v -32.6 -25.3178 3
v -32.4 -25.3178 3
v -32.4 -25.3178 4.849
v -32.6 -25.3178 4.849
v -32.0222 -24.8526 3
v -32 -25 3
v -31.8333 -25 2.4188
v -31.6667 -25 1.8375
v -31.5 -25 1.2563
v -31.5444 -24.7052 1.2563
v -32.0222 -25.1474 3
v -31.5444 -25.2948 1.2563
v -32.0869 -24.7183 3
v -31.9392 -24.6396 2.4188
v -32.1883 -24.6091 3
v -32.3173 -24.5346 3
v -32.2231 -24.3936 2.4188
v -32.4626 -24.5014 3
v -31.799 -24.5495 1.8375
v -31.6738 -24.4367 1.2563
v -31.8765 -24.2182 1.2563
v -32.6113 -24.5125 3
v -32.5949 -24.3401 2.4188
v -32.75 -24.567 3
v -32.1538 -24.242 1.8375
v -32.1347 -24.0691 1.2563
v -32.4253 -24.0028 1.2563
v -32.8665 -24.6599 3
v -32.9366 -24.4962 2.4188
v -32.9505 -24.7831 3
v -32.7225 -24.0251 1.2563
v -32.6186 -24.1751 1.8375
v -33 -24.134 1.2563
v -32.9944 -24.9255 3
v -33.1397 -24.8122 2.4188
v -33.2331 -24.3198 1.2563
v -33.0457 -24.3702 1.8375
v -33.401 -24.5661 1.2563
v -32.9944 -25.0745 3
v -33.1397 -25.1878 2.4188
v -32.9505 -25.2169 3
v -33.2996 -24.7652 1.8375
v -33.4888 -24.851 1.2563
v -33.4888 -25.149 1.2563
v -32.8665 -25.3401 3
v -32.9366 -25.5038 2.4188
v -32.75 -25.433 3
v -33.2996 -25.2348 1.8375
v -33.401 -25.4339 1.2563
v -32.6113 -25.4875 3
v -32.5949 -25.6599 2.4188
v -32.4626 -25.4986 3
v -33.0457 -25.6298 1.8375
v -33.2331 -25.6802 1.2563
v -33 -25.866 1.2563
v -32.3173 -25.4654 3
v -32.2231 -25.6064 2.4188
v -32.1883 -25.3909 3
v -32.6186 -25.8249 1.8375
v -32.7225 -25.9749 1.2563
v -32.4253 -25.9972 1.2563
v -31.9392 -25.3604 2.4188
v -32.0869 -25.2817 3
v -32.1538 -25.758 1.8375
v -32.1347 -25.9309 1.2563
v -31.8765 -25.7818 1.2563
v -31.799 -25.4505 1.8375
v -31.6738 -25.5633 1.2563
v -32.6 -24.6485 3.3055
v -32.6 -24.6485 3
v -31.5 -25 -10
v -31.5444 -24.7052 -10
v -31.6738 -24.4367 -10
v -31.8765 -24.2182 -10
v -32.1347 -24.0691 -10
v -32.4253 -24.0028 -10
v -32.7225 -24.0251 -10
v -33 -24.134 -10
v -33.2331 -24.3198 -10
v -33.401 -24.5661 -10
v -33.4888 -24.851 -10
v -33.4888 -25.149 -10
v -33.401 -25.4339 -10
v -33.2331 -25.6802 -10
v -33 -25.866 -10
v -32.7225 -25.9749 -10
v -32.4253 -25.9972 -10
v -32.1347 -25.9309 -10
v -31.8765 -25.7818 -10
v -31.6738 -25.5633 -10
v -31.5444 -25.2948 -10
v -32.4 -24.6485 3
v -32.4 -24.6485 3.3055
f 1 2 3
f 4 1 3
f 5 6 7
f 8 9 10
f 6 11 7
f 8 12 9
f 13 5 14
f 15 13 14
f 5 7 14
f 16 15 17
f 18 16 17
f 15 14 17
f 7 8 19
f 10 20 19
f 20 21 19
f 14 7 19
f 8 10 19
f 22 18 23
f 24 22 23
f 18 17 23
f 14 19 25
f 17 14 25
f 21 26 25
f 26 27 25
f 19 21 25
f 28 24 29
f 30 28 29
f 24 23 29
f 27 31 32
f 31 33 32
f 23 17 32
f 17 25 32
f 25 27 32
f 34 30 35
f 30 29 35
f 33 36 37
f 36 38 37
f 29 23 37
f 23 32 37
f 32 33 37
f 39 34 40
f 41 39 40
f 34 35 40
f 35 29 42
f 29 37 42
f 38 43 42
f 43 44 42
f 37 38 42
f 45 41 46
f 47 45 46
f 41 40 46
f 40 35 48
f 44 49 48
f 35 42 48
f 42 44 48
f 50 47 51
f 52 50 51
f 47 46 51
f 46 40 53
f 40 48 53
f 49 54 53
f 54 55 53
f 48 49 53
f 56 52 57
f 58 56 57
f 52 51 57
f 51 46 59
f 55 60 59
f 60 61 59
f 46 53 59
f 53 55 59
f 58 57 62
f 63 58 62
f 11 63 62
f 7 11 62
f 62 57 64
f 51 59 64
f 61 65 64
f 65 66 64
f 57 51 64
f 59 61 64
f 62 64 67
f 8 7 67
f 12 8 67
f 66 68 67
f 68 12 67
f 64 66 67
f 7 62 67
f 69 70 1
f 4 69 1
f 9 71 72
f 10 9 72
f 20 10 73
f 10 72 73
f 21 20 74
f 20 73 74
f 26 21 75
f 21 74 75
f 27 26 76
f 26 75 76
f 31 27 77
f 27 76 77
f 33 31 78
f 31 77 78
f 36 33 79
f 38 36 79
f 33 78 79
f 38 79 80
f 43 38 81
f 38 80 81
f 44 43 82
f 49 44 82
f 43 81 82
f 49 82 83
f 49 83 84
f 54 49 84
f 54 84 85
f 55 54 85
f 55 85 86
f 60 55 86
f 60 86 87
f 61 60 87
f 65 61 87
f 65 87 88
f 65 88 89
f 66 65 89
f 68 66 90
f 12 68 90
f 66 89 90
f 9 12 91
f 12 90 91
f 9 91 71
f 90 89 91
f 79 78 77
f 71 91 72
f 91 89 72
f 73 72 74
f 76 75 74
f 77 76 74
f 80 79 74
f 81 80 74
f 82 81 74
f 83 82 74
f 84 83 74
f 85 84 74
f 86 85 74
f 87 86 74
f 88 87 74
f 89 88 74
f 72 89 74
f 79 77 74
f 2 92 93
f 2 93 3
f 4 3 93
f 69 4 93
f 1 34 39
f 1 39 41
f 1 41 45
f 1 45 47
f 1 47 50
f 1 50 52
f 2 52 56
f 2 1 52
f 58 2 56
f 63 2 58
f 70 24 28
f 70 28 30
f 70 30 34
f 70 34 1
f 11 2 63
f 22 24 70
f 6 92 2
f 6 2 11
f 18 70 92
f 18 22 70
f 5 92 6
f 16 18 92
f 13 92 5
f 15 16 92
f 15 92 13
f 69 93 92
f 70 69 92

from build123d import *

# Parameters (mm, degrees)
BOSS_EXTRUDE1_DEPTH      = 3
BOSS_EXTRUDE1_DEPTH_BACK = 10
SKETCH1_R                = 1
CHAMFER1_SIZE            = 0.5
CHAMFER1_SIZE2           = 1.743707222
BOSS_EXTRUDE2_DEPTH      = 0.1
BOSS_EXTRUDE2_DEPTH_BACK = 0.1


with BuildPart() as part:
    # Sketch1 → Boss-Extrude1 (new, two sides: drawn at the far end of the back side and taken through both)
    with BuildSketch(Plane.XY.offset(-BOSS_EXTRUDE1_DEPTH_BACK)):
        with Locations((-32.5, -25)):
            Circle(SKETCH1_R)
    extrude(amount=BOSS_EXTRUDE1_DEPTH + BOSS_EXTRUDE1_DEPTH_BACK)

    # Chamfer1
    chamfer1_edges = [part.edges().sort_by_distance(p)[0] for p in [
        (-33.5, -25, 3),
    ]]
    chamfer1_side = [part.faces().sort_by_distance(p)[0] for p in [
        (-32.5, -25, 3),
    ]]
    chamfer(chamfer1_edges, length=CHAMFER1_SIZE, length2=CHAMFER1_SIZE2, reference=chamfer1_side[0])

    # Sketch2 → Boss-Extrude2 (add, two sides: drawn at the far end of the back side and taken through both)
    with BuildSketch(Plane.ZY.offset(32.5).offset(-BOSS_EXTRUDE2_DEPTH_BACK)):
        Polygon((1.471640108, -25.31784203), (4.848999991, -25.31784203), (3.30552546, -24.648450588), (1.471640108, -24.648450588), align=None)
    extrude(amount=BOSS_EXTRUDE2_DEPTH + BOSS_EXTRUDE2_DEPTH_BACK)


solid = part.part
